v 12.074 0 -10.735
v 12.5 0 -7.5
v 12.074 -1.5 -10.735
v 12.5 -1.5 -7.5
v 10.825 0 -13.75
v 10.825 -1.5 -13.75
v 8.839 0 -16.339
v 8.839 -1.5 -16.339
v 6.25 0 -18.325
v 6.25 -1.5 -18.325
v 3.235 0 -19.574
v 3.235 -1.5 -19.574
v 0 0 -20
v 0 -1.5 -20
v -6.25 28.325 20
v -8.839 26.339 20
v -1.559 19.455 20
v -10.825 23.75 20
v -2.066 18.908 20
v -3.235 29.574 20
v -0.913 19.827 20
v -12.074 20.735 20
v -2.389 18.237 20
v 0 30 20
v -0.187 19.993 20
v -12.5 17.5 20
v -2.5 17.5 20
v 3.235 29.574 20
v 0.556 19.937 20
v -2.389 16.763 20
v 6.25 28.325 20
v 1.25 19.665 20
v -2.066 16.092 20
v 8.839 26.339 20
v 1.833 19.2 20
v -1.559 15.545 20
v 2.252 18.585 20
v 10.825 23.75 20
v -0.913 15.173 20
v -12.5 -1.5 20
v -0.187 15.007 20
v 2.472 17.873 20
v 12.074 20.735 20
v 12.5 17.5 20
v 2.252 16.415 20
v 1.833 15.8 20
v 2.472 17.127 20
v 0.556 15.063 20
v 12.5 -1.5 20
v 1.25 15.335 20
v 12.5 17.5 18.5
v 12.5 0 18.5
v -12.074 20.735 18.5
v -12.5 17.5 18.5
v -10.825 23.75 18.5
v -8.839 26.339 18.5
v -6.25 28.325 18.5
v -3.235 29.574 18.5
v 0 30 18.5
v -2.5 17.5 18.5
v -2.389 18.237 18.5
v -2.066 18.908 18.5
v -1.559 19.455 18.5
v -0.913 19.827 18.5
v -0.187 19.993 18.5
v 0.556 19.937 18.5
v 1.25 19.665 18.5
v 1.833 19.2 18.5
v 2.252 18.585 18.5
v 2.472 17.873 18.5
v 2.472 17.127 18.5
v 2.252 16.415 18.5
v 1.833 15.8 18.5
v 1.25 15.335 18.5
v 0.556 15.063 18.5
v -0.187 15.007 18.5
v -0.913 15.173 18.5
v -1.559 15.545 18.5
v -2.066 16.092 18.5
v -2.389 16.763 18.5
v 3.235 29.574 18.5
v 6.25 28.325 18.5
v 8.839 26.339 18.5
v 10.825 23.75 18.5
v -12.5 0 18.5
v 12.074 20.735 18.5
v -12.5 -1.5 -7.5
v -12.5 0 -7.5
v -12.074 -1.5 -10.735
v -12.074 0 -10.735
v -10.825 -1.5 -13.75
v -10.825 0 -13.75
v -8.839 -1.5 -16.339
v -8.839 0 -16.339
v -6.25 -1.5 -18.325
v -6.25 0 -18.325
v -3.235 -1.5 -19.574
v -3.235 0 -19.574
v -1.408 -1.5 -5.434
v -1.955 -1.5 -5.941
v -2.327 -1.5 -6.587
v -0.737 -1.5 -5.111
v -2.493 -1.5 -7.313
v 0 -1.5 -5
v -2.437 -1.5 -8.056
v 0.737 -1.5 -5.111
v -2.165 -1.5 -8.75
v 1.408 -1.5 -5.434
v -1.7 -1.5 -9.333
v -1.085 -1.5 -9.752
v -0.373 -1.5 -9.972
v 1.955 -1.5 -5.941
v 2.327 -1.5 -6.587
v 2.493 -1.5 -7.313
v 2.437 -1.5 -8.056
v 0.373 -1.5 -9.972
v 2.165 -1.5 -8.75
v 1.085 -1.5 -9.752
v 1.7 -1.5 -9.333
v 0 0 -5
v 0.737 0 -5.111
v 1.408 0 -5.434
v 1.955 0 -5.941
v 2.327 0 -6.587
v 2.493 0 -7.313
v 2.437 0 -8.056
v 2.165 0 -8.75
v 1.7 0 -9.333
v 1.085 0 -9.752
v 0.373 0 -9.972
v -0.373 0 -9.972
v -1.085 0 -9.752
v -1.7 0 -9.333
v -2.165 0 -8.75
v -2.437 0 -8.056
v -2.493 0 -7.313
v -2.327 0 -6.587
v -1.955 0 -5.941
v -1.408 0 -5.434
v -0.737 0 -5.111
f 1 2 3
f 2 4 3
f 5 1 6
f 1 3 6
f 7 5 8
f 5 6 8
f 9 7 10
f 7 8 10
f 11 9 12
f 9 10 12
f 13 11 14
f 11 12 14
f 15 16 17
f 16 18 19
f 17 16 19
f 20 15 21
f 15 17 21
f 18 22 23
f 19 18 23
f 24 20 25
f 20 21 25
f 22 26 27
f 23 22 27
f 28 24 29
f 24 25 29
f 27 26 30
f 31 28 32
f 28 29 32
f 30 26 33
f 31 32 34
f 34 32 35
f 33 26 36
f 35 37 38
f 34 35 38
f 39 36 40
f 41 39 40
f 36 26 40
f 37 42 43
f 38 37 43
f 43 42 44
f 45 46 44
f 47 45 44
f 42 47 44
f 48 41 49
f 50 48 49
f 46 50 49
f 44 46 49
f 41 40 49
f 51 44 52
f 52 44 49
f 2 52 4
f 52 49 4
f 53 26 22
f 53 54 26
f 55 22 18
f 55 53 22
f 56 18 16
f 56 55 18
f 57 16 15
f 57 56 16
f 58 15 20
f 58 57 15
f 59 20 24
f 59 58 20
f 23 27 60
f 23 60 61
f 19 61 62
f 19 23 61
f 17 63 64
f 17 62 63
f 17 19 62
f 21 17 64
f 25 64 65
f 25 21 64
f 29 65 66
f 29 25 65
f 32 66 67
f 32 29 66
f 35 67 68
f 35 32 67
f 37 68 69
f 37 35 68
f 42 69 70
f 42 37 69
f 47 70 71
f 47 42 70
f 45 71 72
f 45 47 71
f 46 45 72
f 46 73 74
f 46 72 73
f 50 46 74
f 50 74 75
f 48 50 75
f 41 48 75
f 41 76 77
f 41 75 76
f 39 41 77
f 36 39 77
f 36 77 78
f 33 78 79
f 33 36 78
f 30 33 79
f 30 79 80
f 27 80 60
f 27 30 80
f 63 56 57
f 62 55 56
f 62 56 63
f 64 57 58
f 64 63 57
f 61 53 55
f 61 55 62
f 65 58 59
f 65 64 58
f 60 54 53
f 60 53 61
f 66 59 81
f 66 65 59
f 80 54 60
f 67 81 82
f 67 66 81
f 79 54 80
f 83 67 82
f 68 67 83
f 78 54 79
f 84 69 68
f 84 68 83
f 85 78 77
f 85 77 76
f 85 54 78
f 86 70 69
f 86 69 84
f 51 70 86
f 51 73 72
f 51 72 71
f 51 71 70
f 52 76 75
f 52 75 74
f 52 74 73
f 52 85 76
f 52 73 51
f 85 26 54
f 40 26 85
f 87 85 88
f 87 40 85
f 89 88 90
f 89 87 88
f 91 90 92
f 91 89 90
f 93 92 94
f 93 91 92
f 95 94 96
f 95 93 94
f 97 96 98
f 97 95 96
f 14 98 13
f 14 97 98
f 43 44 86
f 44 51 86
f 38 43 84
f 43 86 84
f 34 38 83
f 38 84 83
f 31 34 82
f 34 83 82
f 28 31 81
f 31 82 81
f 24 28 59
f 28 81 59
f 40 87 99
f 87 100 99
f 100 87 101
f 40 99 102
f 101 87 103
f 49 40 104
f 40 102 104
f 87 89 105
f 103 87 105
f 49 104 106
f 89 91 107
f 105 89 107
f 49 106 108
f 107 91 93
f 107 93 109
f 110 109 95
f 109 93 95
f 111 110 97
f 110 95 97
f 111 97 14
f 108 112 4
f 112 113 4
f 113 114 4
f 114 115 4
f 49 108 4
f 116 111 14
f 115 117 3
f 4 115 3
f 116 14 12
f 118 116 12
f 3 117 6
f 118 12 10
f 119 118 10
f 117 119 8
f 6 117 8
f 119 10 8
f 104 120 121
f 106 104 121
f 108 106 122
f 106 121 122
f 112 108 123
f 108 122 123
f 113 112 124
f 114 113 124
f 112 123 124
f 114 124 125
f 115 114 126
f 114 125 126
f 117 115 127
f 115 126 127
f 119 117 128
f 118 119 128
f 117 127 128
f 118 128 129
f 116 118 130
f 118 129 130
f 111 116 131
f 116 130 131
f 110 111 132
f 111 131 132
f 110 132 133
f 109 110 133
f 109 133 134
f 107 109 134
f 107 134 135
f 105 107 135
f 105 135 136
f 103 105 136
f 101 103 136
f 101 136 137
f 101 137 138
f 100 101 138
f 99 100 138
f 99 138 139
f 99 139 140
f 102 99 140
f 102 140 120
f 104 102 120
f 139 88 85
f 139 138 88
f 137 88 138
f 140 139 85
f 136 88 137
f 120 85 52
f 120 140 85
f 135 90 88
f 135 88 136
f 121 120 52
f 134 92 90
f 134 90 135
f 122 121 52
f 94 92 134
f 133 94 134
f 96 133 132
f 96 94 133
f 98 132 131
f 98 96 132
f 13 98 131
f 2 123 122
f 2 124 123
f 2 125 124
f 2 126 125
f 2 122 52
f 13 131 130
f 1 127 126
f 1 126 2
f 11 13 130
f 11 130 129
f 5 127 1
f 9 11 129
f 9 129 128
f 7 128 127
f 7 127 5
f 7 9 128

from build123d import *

# Parameters (mm, degrees)
SKETCH1_W               = 25
SKETCH1_H               = 38.5
SKETCH1_H_2             = 1.5
BOSS_EXTRUDE1_DEPTH     = 1.5
SKETCH1_3_W             = 25
SKETCH1_3_H             = 1.5
BOSS_EXTRUDE2_DEPTH     = 30
FILLET1_R               = 12.5
SKETCH2_R               = 2.5
CUT_EXTRUDE1_DEPTH      = 39.160843806
CUT_EXTRUDE2_DEPTH      = 51.383529055
CUT_EXTRUDE2_DEPTH_BACK = 51.383529055
SKETCH3_R               = 2.5


with BuildPart() as part:
    # Sketch1 → Boss-Extrude1 (new body)
    with BuildSketch(Plane(origin=(0, 0, 0), x_dir=(1, 0, 0), z_dir=(0, 1, 0))):
        with Locations((0, 0.75)):
            Rectangle(SKETCH1_W, SKETCH1_H)
        with Locations((0, -19.25)):
            Rectangle(SKETCH1_W, SKETCH1_H_2)
    extrude(amount=-BOSS_EXTRUDE1_DEPTH)

    # Sketch1<3> → Boss-Extrude2 (add)
    with BuildSketch(Plane(origin=(0, 0, 0), x_dir=(1, 0, 0), z_dir=(0, 1, 0))):
        with Locations((0, -19.25)):
            Rectangle(SKETCH1_3_W, SKETCH1_3_H)
    extrude(amount=BOSS_EXTRUDE2_DEPTH)

    # Fillet1
    fillet1_edges = [part.edges().sort_by_distance(p)[0] for p in [
        (-12.5, 30, 19.25),
        (12.5, 30, 19.25),
        (-12.5, -0.75, -20),
        (12.5, -0.75, -20),
    ]]
    fillet(fillet1_edges, radius=FILLET1_R - 0.0001)  # a hair under: the kernel refuses the full size

    # Sketch2 → Cut-Extrude1 (cut, through all)
    with BuildSketch(Plane(origin=(0, 0, 0), x_dir=(1, 0, 0), z_dir=(0, 1, 0))):
        with Locations(Location((0, 7.5, 0), (0, 0, 270))):
            Circle(SKETCH2_R)
    extrude(amount=-CUT_EXTRUDE1_DEPTH, mode=Mode.SUBTRACT)

    # Sketch3 → Cut-Extrude2 (cut, two sides: drawn at the far end of the back side and taken through both)
    with BuildSketch(Plane(origin=(0, 0, 18.5), x_dir=(-1, 0, 0), z_dir=(0, 0, -1)).offset(-CUT_EXTRUDE2_DEPTH_BACK)):
        with Locations((0, 17.5)):
            Circle(SKETCH3_R)
    extrude(amount=CUT_EXTRUDE2_DEPTH + CUT_EXTRUDE2_DEPTH_BACK, mode=Mode.SUBTRACT)


solid = part.part
